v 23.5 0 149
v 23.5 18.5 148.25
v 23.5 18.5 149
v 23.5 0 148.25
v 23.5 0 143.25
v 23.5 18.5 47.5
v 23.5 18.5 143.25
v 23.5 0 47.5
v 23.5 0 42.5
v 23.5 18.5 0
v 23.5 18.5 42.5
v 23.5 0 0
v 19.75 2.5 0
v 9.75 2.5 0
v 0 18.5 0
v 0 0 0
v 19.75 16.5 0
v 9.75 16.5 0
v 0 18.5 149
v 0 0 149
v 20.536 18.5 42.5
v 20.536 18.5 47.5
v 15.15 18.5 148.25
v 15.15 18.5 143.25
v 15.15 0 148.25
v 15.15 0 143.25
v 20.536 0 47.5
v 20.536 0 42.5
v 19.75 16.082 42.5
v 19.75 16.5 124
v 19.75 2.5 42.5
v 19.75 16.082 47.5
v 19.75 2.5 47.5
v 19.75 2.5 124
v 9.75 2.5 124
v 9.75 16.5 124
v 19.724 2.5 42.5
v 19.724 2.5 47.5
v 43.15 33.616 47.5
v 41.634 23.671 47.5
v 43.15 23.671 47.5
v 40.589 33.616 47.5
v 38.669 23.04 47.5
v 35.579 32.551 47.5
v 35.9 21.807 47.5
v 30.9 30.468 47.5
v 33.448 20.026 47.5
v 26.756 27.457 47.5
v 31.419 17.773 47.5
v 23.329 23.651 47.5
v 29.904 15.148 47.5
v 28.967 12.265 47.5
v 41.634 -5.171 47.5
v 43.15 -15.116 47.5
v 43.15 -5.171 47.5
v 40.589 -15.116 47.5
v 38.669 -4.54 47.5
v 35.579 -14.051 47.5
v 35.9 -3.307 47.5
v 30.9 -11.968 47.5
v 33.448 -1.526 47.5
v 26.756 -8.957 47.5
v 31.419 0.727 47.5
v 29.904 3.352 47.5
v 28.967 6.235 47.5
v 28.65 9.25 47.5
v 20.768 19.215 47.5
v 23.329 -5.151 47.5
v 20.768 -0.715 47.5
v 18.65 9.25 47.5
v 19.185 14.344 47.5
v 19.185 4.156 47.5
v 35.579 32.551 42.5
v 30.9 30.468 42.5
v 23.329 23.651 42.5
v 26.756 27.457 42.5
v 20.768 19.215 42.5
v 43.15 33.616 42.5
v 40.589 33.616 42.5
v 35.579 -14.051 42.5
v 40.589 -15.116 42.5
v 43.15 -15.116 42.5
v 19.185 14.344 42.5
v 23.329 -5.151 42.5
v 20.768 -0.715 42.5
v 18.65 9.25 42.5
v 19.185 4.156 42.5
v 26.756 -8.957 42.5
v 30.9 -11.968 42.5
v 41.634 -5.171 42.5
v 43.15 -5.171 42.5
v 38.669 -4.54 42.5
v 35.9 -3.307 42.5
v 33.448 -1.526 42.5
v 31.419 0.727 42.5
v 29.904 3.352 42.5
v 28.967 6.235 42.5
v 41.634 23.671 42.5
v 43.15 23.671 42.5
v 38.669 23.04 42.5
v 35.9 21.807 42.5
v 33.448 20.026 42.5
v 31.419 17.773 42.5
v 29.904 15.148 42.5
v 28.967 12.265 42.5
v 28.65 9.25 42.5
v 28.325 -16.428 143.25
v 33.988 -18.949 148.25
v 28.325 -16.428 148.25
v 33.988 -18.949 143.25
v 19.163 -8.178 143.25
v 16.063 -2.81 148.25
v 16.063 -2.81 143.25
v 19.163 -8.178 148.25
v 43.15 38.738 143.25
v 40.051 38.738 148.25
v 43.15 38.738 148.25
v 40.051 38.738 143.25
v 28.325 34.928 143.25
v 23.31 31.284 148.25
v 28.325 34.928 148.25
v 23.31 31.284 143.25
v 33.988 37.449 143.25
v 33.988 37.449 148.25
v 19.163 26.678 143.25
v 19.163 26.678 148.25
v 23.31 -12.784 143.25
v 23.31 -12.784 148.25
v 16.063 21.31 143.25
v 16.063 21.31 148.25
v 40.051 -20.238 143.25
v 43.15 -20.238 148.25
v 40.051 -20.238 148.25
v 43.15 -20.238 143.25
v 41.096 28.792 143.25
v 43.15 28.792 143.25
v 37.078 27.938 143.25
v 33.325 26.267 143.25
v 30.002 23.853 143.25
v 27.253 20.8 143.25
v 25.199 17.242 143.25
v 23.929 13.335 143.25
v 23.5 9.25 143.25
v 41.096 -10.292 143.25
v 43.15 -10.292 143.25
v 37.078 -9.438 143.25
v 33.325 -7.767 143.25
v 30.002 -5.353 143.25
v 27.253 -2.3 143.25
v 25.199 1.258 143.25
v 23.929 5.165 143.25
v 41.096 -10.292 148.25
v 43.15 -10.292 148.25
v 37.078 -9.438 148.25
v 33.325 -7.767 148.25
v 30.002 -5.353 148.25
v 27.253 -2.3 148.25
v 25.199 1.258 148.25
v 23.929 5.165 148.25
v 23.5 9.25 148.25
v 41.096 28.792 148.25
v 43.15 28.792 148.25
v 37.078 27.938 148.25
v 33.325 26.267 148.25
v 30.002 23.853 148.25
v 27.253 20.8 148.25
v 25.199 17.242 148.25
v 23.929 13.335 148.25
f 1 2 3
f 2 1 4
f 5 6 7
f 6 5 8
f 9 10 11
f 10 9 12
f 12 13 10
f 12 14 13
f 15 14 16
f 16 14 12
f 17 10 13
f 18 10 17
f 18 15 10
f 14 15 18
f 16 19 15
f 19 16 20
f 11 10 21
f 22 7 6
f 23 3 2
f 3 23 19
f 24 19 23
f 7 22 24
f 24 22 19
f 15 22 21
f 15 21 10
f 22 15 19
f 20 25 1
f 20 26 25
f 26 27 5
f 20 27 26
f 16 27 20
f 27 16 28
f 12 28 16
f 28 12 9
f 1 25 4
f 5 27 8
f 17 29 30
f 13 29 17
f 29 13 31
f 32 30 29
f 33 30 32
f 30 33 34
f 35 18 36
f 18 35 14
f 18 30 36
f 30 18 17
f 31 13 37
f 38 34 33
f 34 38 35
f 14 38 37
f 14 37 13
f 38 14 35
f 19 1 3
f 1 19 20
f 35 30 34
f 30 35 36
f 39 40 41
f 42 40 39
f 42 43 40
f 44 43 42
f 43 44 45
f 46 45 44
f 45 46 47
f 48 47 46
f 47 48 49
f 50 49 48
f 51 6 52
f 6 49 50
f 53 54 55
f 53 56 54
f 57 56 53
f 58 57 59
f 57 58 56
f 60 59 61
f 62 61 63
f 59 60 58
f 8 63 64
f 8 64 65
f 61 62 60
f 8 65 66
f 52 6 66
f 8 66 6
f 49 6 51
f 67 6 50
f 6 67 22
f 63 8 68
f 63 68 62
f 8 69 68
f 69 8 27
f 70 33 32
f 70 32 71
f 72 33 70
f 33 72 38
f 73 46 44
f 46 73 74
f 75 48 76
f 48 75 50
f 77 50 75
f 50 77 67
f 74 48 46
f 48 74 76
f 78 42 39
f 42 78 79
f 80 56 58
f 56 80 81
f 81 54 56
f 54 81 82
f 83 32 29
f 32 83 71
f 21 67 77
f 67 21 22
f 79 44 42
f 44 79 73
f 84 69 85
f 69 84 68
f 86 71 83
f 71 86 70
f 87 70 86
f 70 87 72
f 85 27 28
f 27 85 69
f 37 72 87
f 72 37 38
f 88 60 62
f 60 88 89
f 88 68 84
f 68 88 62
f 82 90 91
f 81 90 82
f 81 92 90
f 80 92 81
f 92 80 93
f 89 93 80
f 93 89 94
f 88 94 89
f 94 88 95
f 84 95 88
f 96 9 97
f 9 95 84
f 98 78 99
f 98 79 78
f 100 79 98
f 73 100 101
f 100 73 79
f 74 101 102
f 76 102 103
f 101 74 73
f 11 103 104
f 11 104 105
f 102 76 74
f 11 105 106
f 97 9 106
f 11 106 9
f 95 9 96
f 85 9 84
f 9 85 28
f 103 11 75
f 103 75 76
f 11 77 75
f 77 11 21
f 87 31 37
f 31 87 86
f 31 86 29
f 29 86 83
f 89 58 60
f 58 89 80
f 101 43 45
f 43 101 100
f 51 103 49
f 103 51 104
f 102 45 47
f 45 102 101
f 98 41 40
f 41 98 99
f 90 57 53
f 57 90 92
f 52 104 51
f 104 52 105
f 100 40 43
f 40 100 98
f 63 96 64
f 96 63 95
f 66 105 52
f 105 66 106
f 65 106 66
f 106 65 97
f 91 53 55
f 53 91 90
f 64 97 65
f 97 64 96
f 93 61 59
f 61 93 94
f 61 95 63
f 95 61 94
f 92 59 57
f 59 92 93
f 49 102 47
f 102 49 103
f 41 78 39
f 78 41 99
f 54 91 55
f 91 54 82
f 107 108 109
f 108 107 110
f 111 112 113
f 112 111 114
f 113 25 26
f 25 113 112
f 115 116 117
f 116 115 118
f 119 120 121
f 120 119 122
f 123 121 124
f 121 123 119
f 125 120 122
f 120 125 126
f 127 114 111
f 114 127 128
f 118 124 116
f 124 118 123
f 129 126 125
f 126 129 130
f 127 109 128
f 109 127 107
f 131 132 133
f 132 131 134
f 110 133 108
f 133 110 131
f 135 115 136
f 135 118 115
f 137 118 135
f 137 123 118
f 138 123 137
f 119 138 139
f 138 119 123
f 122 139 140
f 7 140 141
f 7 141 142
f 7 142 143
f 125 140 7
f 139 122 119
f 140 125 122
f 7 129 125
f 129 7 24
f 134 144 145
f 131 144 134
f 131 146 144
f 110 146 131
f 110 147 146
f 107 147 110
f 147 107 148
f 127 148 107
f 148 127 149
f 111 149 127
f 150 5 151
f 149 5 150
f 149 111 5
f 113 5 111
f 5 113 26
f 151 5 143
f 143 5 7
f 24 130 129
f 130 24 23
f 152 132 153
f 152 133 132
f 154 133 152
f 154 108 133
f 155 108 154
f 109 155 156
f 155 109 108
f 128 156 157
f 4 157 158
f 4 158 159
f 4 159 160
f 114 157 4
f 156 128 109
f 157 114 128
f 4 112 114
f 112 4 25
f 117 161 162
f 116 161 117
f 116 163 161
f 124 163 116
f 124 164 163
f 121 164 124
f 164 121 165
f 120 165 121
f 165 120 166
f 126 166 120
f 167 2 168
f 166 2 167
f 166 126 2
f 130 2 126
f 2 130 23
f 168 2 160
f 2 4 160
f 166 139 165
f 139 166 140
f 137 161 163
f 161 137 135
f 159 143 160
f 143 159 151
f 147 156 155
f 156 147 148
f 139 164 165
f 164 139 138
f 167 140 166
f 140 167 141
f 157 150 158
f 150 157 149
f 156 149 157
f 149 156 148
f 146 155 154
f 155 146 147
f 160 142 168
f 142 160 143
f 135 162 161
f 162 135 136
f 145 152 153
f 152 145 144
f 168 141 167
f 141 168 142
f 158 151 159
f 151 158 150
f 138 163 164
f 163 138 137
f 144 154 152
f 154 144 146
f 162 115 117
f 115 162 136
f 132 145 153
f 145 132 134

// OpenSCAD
ext_length = 9;
finger_width = 9.5;
finger_depth = 13.5;
space = 0.5;

height = 20; //personal choice
padding = 5;
lower_diam = 28.5;
upper_diam = 38.8;

indent_1 = 22.5;
indent_2 = 123.25;

total_length = 124;

//TODO: 15 mm extrusion

clamp();

module base(){
    difference(){
        cube([ext_length + finger_width + padding,finger_depth + padding,height]);
        translate([padding + finger_width/2, padding/2, 0]) cube([finger_width + space, finger_depth + space, height]);
    }
}

module extension(){
    difference(){
        cube([ext_length + finger_width + padding,finger_depth + padding, total_length + padding]);   
        translate([padding + finger_width/2, padding/2, 0]) cube([finger_width + space, finger_depth + space, total_length - height]);
    }
}

module lower_ring(){
    difference(){
        cylinder(h=padding, r=space/2 + lower_diam/2 + padding*2);
        cylinder(h=padding, r=space/2 + lower_diam/2); 
        translate([(space/2 + lower_diam/2 + padding/2), 0, padding/2]) cube( [space + lower_diam + padding, space + lower_diam + padding*5, padding], true);   
    }
}

module upper_ring(){
    difference(){
        cylinder(h=padding, r=space/2 + upper_diam/2 + padding*2);
        cylinder(h=padding, r=space/2 + upper_diam/2);
        translate([(space/2 + upper_diam/2 + padding/2), 0, padding/2]) cube( [space + upper_diam + padding, space + upper_diam + padding*5, padding], true); 
    }
}

module connector(){
    cube([(upper_diam - lower_diam)/2, finger_depth + padding, padding]);
}


module clamp(){
        union(){
            base();
            translate([0, 0, height]) extension();
            translate([ext_length + finger_width + padding, 0.0, 0.0]) translate([0.0, 0.0, height + indent_1]) connector();
            translate([(upper_diam - lower_diam)/2, 0, 0]) translate([space/2 + lower_diam/2, 0, 0]) translate([ext_length + finger_width + padding, (finger_depth + padding)/2.0, 0]) translate([0.0, 0.0, height + indent_1]) lower_ring();
            translate([space/2 + upper_diam/2, 0, 0]) translate([ext_length + finger_width + padding, (finger_depth + padding)/2.0, 0]) translate([0.0, 0.0, height + indent_2]) upper_ring();
        }

    
}
